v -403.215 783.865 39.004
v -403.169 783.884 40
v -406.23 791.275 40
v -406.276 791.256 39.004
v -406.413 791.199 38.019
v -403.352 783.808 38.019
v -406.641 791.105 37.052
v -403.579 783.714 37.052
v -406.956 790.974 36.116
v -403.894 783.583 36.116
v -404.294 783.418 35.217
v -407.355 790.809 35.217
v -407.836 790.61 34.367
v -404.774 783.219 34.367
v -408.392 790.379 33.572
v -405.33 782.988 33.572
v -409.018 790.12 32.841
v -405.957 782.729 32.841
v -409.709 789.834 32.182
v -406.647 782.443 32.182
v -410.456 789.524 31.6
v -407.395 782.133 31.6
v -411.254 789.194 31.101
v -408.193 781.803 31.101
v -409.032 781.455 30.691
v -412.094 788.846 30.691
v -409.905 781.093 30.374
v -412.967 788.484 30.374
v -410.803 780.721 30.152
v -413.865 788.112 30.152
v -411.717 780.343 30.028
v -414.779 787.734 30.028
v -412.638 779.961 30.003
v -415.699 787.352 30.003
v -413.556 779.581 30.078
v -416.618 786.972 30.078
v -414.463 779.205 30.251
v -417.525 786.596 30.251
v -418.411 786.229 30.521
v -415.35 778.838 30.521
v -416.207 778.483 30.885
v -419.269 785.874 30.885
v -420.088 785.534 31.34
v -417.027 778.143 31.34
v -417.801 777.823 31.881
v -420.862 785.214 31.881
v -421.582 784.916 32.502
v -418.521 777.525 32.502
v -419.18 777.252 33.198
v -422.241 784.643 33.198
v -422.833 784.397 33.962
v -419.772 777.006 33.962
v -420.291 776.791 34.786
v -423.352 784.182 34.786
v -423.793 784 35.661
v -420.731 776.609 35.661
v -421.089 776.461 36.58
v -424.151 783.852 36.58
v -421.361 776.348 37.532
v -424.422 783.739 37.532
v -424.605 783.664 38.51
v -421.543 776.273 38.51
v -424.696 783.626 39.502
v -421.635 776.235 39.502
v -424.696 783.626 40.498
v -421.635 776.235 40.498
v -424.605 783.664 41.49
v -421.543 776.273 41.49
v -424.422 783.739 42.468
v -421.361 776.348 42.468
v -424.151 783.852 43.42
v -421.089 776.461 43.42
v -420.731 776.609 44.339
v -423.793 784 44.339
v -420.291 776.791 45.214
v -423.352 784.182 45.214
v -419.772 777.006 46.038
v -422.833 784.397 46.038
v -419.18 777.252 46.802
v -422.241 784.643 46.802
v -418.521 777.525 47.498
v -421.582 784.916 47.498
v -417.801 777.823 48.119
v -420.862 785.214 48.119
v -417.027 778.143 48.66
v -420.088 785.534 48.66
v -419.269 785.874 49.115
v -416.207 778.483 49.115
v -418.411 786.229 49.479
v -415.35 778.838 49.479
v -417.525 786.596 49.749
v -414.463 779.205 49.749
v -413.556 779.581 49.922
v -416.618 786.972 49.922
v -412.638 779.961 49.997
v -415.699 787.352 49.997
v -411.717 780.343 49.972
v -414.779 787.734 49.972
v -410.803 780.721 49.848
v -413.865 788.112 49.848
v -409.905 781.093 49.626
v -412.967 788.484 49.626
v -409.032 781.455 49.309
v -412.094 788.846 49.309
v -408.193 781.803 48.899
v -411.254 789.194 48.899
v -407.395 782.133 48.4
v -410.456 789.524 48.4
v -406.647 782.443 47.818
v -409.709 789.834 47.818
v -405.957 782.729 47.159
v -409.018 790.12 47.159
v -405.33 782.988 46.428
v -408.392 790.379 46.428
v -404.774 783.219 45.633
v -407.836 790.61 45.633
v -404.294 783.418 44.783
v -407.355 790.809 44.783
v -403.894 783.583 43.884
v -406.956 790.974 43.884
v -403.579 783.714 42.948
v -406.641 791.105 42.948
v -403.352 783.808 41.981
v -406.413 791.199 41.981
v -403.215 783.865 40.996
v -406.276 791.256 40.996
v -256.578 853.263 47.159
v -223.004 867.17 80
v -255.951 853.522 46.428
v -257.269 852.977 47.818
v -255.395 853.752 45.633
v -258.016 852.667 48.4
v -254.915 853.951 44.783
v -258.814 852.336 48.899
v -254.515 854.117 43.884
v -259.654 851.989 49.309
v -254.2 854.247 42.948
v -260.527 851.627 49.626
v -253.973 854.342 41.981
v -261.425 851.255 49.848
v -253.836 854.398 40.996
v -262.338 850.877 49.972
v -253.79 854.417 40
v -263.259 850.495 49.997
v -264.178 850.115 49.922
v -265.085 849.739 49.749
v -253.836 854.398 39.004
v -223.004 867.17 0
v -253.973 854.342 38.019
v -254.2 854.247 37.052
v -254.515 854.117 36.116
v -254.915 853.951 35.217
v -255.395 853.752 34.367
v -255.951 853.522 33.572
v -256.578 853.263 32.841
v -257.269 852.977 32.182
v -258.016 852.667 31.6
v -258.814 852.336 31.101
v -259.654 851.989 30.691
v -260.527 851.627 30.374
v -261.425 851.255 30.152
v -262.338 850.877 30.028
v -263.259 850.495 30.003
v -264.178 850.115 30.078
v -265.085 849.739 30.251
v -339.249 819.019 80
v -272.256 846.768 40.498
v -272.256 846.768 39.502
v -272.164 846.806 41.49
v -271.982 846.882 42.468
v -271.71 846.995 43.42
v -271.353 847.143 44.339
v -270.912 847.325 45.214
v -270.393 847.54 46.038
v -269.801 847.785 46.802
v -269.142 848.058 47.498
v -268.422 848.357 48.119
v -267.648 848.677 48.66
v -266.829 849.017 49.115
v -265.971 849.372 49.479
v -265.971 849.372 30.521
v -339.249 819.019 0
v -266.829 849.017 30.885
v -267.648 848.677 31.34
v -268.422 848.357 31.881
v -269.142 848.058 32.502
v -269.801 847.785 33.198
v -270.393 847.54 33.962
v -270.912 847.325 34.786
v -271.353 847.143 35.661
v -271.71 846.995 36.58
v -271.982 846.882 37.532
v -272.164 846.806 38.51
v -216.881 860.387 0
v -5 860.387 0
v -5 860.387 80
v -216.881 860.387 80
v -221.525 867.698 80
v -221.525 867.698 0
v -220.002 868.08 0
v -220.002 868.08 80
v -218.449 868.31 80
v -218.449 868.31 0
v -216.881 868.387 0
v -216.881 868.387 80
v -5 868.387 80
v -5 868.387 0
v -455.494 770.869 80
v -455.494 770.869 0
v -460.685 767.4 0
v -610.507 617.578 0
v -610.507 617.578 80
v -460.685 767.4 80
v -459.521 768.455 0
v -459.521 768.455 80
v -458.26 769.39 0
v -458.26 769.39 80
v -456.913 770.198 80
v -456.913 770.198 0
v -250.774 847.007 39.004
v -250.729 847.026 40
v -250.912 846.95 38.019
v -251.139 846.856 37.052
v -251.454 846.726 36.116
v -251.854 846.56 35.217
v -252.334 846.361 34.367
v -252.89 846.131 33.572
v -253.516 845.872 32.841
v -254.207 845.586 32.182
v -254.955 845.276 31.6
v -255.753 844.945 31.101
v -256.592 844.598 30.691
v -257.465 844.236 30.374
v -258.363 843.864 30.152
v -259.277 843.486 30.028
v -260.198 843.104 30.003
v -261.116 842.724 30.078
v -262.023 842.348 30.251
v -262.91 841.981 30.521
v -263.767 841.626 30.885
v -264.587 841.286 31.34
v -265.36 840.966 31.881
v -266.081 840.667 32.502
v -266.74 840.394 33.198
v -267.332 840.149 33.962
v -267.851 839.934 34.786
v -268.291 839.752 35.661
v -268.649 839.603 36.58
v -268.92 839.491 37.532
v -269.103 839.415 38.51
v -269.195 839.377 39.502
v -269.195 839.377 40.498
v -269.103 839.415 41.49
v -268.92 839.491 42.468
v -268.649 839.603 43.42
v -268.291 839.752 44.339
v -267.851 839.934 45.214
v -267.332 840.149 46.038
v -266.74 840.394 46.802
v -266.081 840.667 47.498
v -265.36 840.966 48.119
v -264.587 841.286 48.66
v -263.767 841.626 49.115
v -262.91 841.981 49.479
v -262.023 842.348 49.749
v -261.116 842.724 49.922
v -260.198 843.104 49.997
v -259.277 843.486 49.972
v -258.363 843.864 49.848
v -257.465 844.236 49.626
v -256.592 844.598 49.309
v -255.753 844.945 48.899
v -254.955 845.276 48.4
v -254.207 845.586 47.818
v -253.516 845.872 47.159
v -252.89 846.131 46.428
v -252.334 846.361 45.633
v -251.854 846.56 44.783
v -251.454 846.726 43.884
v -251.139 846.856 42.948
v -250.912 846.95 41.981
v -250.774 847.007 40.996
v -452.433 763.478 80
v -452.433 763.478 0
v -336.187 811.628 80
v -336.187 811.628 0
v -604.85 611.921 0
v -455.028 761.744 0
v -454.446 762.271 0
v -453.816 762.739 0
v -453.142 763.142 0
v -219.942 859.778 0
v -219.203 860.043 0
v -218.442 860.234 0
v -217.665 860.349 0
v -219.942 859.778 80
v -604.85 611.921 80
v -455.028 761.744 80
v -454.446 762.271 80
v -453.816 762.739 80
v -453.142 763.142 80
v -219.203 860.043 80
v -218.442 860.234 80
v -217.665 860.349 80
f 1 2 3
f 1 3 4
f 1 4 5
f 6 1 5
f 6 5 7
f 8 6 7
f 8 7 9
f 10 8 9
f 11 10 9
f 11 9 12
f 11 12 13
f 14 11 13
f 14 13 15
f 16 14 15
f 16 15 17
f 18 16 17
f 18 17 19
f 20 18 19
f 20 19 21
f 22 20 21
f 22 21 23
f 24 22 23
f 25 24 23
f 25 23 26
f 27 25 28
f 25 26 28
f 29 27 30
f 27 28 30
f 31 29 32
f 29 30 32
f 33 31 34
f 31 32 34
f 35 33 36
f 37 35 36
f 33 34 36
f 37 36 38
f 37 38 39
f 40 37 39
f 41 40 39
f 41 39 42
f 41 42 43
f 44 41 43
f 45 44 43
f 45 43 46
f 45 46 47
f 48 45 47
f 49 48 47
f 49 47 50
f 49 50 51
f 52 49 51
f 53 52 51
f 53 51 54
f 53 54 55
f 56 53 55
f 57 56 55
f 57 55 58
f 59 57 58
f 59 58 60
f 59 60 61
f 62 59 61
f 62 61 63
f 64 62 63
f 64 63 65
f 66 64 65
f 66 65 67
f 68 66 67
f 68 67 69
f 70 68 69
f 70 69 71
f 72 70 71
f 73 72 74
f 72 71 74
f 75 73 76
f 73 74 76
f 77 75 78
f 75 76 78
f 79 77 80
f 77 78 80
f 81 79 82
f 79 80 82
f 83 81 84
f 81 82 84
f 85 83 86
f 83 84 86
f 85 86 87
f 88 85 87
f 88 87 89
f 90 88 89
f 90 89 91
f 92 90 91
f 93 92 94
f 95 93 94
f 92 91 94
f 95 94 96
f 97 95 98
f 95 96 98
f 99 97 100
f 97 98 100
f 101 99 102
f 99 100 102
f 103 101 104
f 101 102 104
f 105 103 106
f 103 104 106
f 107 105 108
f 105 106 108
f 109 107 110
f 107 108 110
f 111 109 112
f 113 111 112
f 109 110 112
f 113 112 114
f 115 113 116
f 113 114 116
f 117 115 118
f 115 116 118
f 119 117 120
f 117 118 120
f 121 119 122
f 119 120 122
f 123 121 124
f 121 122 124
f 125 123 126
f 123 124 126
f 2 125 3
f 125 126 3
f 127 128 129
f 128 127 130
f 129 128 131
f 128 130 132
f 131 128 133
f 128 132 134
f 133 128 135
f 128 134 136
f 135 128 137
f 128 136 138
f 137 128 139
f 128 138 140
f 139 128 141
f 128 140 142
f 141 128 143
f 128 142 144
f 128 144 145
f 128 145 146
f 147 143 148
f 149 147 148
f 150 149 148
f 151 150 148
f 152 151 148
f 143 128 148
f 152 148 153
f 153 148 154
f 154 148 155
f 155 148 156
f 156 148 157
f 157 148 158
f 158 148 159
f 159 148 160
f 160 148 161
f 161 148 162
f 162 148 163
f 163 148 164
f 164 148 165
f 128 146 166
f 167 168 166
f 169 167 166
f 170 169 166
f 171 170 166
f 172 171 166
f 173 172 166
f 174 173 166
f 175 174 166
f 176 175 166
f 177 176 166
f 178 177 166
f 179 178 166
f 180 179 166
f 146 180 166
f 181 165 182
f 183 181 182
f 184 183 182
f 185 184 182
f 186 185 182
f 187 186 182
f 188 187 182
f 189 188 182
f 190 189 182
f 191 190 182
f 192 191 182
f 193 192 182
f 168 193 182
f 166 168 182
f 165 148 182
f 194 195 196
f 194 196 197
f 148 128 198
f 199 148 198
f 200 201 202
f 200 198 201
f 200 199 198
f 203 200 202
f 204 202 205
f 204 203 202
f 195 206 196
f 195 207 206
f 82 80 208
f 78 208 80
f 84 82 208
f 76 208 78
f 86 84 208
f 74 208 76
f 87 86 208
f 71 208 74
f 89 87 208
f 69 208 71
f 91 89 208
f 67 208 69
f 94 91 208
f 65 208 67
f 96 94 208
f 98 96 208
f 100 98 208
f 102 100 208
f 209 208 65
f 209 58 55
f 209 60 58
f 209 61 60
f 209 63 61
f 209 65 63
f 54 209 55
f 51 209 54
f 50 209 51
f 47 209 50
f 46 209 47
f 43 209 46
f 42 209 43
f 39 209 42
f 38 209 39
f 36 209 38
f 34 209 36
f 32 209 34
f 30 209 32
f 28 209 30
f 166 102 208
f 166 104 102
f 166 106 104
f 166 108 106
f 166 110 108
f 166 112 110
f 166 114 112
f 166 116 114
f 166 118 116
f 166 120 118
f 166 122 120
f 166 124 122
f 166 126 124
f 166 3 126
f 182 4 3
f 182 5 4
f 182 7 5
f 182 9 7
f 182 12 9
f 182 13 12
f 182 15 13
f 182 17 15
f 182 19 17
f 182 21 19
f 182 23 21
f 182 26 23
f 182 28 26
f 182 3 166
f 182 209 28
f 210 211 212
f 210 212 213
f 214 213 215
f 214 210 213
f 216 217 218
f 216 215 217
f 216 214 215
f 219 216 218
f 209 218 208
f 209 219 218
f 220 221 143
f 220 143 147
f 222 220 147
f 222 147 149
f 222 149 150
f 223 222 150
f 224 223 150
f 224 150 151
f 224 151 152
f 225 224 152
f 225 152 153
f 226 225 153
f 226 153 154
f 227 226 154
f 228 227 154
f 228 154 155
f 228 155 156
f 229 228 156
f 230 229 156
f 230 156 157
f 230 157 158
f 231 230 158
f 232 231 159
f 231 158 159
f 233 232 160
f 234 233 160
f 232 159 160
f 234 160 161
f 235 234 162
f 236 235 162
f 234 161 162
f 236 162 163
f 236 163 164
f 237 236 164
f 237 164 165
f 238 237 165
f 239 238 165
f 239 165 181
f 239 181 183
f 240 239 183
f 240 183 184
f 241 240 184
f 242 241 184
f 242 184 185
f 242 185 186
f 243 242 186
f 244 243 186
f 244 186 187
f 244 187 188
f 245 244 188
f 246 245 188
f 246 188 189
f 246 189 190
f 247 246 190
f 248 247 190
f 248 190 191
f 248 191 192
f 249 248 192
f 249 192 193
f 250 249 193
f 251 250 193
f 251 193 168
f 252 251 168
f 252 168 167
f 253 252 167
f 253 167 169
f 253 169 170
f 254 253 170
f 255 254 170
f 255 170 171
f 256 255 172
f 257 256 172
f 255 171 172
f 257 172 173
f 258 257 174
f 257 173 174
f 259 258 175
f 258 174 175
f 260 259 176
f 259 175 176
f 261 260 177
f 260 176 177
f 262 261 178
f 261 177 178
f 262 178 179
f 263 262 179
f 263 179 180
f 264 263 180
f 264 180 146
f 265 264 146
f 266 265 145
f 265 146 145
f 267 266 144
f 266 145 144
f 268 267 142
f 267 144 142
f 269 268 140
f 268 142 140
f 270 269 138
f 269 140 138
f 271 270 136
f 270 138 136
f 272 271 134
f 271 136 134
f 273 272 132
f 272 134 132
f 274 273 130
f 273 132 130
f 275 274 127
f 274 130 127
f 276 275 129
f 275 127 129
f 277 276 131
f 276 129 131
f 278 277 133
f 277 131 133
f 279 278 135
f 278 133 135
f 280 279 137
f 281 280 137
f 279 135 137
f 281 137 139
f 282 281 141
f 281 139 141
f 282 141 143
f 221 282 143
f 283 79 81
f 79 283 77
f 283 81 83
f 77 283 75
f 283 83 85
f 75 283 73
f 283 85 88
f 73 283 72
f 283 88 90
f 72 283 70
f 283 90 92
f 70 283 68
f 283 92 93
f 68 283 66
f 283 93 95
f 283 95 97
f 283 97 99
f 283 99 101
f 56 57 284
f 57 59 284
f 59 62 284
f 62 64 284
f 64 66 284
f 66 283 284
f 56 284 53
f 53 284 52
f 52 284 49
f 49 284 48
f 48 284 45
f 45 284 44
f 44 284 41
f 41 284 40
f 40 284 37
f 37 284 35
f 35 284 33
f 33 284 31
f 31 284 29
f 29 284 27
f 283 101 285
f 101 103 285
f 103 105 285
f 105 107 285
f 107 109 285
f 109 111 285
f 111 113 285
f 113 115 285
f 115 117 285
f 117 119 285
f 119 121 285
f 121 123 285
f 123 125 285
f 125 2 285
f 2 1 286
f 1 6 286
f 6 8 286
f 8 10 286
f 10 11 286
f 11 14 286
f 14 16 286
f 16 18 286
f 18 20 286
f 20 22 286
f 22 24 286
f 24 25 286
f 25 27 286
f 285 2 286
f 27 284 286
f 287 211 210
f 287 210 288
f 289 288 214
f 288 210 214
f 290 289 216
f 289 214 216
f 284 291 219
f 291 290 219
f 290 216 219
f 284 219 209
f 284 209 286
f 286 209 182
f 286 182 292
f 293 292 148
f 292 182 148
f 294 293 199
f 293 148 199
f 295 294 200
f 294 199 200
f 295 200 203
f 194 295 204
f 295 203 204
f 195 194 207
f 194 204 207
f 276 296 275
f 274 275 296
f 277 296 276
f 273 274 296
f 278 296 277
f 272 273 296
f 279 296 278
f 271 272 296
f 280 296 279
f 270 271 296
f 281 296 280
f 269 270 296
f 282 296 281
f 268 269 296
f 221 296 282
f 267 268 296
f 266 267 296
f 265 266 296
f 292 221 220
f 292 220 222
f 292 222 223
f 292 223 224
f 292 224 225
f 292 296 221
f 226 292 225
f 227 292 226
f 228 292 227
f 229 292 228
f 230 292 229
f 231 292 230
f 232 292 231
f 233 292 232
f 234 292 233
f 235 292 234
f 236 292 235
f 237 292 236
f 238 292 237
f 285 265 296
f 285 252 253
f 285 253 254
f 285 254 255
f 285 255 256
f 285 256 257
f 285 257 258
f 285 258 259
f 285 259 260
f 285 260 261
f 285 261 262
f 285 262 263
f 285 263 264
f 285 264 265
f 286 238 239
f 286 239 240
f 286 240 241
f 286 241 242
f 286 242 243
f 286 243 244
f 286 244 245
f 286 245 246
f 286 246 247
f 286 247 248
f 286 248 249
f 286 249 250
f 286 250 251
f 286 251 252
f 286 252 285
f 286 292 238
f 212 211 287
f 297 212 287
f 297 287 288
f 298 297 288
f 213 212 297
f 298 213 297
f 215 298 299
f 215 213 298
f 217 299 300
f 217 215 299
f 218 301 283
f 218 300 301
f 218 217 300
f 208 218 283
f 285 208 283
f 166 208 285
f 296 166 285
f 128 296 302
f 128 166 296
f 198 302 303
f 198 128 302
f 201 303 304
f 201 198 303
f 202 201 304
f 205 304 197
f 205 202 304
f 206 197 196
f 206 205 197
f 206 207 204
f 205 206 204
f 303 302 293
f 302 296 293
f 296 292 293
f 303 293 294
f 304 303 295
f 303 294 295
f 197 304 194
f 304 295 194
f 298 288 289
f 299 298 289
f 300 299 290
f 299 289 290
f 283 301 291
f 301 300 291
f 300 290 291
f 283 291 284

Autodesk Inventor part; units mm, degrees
ref_plane "YZ Plane" through (0, 0, 0) normal (1, 0, 0) x (0, 1, 0)
ref_plane "XZ Plane" through (0, 0, 0) normal (0, 1, 0) x (-1, 0, 0)
ref_plane "XY Plane" through (0, 0, 0) normal (0, 0, 1) x (1, 0, 0)
sketch "Sketch2" plane through (0, 0, 0) normal (0, 0, 1) x (1, 0, 0)
  line L0 (0, 277.6336) -> (196.3166, 196.3166) construction
  line L1 (196.3166, 196.3166) -> (277.6336, 0) construction
  line L2 (277.6336, 0) -> (196.3166, -196.3166) construction
  line L3 (196.3166, -196.3166) -> (0, -277.6336) construction
  line L4 (0, -277.6336) -> (-196.3166, -196.3166) construction
  line L5 (-196.3166, -196.3166) -> (-277.6336, 0) construction
  line L6 (-277.6336, 0) -> (-196.3166, 196.3166) construction
  line L7 (-196.3166, 196.3166) -> (0, 277.6336) construction
  line L8 (-196.3166, 196.3166) -> (0, 277.6336) construction
  line L9 (-461.2666, 773.8898) -> (-221.0579, 873.3874) construction
  line L10 (-98.1583, 236.9751) -> (-341.1623, 823.6386) construction
  line L11 (-221.0579, 873.3874) -> (0, 873.3874) construction
  line L12 (0, 873.3874) -> (0, 277.6336) construction
  line L13 (-461.2666, 773.8898) -> (-617.5782, 617.5782) construction
  line L14 (-617.5782, 617.5782) -> (-196.3166, 196.3166) construction
  line L15 (-223.0037, 867.1695) -> (-339.2489, 819.0192)
  line L16 (-5, 868.3874) -> (-216.8808, 868.3874)
  line L17 (-455.494, 770.8689) -> (-339.2489, 819.0192)
  line L18 (-610.5071, 617.5782) -> (-460.6848, 767.4005)
  arc A0 (-216.8808, 868.3874) -> (-223.0037, 867.1695) centre (-216.8808, 852.3874) ccw
  arc A1 (-455.494, 770.8689) -> (-460.6848, 767.4005) centre (-449.3711, 756.0868) ccw
  point P0 (0, 0)
  point P1 (0, 0)
  point P2 (0, 0)
  point P3 (-220.0634, 868.3874)
  point P4 (-458.4343, 769.651)
  dimension "d0" = 513
  dimension "d1" = 260
  dimension "d2" = 635
  dimension "d6" = 5
  dimension "d10" = 5
  dimension "d14" = 5
  dimension "d15" = 16
contour flange "Contour Flange1" sketch "Sketch2" thickness 8 bend radius 8 width 80 along (0, 0, 1) mid plane no both sides no wall seen from (-110.9404, 868.3874, 0) lies toward (0, -1, 0) curves L16 A0 L15 L17 A1 L18
bend "Bend1"
corner "Corner1"
sketch "Sketch3" plane through (-455.494, 770.8689, 80) normal (-0.3826834, 0.9238795, 0) x (0.9238795, 0.3826834, 0)
  line L0 (125.8228, 80) -> (125.8228, 0) construction
  line L1 (0, 0) -> (251.6457, 0) projected
  circle A0 centre (43.3228, 40) radius 10
  circle A1 centre (208.3228, 40) radius 10
  point P0 (125.8228, 40)
  dimension "d27" = 20
  dimension "d28" = 82.5
extrude "Extrusion1" cut sketch "Sketch3" against normal up to surface (8 mm away)
equation "\"d0\" = Барабан_габарит_по_кассетам"
equation "\"d1\" = Кассета_длина_грани"
equation "\"d2\" = Кассета_высота"
equation "\"d10\" = d6"
equation "\"d15\" = BendRadius + Thickness"
equation "\"d16\" = Thickness"
equation "\"d17\" = BendReliefWidth"
equation "\"d18\" = BendReliefDepth"
equation "\"d19\" = MinimumRemnant"
equation "\"d20\" = TransitionRadius"
equation "\"d22\" = BendRadius"
equation "\"d24\" = CornerReliefSize"
equation "\"d25\" = GapSize"
equation "\"d26\" = JacobiRadiusSize"
equation "\"BendRadius\" = Thickness"
equation "\"BendReliefWidth\" = Thickness"
equation "\"BendReliefDepth\" = 0.5 * Thickness"
equation "\"CornerReliefSize\" = 4 * Thickness"
equation "\"MinimumRemnant\" = 2 * Thickness"
equation "\"TransitionRadius\" = BendRadius"
equation "\"JacobiRadiusSize\" = BendRadius"
equation "\"GapSize\" = Thickness"
equation "\"Барабан_габарит_по_кассетам\" = 513"
equation "\"Кассета_длина_грани\" = 260"
equation "\"Кассета_высота\" = 635"
equation "\"Thickness\" = 8"
properties part number "ДМФ 01 52 Верхний лист"
